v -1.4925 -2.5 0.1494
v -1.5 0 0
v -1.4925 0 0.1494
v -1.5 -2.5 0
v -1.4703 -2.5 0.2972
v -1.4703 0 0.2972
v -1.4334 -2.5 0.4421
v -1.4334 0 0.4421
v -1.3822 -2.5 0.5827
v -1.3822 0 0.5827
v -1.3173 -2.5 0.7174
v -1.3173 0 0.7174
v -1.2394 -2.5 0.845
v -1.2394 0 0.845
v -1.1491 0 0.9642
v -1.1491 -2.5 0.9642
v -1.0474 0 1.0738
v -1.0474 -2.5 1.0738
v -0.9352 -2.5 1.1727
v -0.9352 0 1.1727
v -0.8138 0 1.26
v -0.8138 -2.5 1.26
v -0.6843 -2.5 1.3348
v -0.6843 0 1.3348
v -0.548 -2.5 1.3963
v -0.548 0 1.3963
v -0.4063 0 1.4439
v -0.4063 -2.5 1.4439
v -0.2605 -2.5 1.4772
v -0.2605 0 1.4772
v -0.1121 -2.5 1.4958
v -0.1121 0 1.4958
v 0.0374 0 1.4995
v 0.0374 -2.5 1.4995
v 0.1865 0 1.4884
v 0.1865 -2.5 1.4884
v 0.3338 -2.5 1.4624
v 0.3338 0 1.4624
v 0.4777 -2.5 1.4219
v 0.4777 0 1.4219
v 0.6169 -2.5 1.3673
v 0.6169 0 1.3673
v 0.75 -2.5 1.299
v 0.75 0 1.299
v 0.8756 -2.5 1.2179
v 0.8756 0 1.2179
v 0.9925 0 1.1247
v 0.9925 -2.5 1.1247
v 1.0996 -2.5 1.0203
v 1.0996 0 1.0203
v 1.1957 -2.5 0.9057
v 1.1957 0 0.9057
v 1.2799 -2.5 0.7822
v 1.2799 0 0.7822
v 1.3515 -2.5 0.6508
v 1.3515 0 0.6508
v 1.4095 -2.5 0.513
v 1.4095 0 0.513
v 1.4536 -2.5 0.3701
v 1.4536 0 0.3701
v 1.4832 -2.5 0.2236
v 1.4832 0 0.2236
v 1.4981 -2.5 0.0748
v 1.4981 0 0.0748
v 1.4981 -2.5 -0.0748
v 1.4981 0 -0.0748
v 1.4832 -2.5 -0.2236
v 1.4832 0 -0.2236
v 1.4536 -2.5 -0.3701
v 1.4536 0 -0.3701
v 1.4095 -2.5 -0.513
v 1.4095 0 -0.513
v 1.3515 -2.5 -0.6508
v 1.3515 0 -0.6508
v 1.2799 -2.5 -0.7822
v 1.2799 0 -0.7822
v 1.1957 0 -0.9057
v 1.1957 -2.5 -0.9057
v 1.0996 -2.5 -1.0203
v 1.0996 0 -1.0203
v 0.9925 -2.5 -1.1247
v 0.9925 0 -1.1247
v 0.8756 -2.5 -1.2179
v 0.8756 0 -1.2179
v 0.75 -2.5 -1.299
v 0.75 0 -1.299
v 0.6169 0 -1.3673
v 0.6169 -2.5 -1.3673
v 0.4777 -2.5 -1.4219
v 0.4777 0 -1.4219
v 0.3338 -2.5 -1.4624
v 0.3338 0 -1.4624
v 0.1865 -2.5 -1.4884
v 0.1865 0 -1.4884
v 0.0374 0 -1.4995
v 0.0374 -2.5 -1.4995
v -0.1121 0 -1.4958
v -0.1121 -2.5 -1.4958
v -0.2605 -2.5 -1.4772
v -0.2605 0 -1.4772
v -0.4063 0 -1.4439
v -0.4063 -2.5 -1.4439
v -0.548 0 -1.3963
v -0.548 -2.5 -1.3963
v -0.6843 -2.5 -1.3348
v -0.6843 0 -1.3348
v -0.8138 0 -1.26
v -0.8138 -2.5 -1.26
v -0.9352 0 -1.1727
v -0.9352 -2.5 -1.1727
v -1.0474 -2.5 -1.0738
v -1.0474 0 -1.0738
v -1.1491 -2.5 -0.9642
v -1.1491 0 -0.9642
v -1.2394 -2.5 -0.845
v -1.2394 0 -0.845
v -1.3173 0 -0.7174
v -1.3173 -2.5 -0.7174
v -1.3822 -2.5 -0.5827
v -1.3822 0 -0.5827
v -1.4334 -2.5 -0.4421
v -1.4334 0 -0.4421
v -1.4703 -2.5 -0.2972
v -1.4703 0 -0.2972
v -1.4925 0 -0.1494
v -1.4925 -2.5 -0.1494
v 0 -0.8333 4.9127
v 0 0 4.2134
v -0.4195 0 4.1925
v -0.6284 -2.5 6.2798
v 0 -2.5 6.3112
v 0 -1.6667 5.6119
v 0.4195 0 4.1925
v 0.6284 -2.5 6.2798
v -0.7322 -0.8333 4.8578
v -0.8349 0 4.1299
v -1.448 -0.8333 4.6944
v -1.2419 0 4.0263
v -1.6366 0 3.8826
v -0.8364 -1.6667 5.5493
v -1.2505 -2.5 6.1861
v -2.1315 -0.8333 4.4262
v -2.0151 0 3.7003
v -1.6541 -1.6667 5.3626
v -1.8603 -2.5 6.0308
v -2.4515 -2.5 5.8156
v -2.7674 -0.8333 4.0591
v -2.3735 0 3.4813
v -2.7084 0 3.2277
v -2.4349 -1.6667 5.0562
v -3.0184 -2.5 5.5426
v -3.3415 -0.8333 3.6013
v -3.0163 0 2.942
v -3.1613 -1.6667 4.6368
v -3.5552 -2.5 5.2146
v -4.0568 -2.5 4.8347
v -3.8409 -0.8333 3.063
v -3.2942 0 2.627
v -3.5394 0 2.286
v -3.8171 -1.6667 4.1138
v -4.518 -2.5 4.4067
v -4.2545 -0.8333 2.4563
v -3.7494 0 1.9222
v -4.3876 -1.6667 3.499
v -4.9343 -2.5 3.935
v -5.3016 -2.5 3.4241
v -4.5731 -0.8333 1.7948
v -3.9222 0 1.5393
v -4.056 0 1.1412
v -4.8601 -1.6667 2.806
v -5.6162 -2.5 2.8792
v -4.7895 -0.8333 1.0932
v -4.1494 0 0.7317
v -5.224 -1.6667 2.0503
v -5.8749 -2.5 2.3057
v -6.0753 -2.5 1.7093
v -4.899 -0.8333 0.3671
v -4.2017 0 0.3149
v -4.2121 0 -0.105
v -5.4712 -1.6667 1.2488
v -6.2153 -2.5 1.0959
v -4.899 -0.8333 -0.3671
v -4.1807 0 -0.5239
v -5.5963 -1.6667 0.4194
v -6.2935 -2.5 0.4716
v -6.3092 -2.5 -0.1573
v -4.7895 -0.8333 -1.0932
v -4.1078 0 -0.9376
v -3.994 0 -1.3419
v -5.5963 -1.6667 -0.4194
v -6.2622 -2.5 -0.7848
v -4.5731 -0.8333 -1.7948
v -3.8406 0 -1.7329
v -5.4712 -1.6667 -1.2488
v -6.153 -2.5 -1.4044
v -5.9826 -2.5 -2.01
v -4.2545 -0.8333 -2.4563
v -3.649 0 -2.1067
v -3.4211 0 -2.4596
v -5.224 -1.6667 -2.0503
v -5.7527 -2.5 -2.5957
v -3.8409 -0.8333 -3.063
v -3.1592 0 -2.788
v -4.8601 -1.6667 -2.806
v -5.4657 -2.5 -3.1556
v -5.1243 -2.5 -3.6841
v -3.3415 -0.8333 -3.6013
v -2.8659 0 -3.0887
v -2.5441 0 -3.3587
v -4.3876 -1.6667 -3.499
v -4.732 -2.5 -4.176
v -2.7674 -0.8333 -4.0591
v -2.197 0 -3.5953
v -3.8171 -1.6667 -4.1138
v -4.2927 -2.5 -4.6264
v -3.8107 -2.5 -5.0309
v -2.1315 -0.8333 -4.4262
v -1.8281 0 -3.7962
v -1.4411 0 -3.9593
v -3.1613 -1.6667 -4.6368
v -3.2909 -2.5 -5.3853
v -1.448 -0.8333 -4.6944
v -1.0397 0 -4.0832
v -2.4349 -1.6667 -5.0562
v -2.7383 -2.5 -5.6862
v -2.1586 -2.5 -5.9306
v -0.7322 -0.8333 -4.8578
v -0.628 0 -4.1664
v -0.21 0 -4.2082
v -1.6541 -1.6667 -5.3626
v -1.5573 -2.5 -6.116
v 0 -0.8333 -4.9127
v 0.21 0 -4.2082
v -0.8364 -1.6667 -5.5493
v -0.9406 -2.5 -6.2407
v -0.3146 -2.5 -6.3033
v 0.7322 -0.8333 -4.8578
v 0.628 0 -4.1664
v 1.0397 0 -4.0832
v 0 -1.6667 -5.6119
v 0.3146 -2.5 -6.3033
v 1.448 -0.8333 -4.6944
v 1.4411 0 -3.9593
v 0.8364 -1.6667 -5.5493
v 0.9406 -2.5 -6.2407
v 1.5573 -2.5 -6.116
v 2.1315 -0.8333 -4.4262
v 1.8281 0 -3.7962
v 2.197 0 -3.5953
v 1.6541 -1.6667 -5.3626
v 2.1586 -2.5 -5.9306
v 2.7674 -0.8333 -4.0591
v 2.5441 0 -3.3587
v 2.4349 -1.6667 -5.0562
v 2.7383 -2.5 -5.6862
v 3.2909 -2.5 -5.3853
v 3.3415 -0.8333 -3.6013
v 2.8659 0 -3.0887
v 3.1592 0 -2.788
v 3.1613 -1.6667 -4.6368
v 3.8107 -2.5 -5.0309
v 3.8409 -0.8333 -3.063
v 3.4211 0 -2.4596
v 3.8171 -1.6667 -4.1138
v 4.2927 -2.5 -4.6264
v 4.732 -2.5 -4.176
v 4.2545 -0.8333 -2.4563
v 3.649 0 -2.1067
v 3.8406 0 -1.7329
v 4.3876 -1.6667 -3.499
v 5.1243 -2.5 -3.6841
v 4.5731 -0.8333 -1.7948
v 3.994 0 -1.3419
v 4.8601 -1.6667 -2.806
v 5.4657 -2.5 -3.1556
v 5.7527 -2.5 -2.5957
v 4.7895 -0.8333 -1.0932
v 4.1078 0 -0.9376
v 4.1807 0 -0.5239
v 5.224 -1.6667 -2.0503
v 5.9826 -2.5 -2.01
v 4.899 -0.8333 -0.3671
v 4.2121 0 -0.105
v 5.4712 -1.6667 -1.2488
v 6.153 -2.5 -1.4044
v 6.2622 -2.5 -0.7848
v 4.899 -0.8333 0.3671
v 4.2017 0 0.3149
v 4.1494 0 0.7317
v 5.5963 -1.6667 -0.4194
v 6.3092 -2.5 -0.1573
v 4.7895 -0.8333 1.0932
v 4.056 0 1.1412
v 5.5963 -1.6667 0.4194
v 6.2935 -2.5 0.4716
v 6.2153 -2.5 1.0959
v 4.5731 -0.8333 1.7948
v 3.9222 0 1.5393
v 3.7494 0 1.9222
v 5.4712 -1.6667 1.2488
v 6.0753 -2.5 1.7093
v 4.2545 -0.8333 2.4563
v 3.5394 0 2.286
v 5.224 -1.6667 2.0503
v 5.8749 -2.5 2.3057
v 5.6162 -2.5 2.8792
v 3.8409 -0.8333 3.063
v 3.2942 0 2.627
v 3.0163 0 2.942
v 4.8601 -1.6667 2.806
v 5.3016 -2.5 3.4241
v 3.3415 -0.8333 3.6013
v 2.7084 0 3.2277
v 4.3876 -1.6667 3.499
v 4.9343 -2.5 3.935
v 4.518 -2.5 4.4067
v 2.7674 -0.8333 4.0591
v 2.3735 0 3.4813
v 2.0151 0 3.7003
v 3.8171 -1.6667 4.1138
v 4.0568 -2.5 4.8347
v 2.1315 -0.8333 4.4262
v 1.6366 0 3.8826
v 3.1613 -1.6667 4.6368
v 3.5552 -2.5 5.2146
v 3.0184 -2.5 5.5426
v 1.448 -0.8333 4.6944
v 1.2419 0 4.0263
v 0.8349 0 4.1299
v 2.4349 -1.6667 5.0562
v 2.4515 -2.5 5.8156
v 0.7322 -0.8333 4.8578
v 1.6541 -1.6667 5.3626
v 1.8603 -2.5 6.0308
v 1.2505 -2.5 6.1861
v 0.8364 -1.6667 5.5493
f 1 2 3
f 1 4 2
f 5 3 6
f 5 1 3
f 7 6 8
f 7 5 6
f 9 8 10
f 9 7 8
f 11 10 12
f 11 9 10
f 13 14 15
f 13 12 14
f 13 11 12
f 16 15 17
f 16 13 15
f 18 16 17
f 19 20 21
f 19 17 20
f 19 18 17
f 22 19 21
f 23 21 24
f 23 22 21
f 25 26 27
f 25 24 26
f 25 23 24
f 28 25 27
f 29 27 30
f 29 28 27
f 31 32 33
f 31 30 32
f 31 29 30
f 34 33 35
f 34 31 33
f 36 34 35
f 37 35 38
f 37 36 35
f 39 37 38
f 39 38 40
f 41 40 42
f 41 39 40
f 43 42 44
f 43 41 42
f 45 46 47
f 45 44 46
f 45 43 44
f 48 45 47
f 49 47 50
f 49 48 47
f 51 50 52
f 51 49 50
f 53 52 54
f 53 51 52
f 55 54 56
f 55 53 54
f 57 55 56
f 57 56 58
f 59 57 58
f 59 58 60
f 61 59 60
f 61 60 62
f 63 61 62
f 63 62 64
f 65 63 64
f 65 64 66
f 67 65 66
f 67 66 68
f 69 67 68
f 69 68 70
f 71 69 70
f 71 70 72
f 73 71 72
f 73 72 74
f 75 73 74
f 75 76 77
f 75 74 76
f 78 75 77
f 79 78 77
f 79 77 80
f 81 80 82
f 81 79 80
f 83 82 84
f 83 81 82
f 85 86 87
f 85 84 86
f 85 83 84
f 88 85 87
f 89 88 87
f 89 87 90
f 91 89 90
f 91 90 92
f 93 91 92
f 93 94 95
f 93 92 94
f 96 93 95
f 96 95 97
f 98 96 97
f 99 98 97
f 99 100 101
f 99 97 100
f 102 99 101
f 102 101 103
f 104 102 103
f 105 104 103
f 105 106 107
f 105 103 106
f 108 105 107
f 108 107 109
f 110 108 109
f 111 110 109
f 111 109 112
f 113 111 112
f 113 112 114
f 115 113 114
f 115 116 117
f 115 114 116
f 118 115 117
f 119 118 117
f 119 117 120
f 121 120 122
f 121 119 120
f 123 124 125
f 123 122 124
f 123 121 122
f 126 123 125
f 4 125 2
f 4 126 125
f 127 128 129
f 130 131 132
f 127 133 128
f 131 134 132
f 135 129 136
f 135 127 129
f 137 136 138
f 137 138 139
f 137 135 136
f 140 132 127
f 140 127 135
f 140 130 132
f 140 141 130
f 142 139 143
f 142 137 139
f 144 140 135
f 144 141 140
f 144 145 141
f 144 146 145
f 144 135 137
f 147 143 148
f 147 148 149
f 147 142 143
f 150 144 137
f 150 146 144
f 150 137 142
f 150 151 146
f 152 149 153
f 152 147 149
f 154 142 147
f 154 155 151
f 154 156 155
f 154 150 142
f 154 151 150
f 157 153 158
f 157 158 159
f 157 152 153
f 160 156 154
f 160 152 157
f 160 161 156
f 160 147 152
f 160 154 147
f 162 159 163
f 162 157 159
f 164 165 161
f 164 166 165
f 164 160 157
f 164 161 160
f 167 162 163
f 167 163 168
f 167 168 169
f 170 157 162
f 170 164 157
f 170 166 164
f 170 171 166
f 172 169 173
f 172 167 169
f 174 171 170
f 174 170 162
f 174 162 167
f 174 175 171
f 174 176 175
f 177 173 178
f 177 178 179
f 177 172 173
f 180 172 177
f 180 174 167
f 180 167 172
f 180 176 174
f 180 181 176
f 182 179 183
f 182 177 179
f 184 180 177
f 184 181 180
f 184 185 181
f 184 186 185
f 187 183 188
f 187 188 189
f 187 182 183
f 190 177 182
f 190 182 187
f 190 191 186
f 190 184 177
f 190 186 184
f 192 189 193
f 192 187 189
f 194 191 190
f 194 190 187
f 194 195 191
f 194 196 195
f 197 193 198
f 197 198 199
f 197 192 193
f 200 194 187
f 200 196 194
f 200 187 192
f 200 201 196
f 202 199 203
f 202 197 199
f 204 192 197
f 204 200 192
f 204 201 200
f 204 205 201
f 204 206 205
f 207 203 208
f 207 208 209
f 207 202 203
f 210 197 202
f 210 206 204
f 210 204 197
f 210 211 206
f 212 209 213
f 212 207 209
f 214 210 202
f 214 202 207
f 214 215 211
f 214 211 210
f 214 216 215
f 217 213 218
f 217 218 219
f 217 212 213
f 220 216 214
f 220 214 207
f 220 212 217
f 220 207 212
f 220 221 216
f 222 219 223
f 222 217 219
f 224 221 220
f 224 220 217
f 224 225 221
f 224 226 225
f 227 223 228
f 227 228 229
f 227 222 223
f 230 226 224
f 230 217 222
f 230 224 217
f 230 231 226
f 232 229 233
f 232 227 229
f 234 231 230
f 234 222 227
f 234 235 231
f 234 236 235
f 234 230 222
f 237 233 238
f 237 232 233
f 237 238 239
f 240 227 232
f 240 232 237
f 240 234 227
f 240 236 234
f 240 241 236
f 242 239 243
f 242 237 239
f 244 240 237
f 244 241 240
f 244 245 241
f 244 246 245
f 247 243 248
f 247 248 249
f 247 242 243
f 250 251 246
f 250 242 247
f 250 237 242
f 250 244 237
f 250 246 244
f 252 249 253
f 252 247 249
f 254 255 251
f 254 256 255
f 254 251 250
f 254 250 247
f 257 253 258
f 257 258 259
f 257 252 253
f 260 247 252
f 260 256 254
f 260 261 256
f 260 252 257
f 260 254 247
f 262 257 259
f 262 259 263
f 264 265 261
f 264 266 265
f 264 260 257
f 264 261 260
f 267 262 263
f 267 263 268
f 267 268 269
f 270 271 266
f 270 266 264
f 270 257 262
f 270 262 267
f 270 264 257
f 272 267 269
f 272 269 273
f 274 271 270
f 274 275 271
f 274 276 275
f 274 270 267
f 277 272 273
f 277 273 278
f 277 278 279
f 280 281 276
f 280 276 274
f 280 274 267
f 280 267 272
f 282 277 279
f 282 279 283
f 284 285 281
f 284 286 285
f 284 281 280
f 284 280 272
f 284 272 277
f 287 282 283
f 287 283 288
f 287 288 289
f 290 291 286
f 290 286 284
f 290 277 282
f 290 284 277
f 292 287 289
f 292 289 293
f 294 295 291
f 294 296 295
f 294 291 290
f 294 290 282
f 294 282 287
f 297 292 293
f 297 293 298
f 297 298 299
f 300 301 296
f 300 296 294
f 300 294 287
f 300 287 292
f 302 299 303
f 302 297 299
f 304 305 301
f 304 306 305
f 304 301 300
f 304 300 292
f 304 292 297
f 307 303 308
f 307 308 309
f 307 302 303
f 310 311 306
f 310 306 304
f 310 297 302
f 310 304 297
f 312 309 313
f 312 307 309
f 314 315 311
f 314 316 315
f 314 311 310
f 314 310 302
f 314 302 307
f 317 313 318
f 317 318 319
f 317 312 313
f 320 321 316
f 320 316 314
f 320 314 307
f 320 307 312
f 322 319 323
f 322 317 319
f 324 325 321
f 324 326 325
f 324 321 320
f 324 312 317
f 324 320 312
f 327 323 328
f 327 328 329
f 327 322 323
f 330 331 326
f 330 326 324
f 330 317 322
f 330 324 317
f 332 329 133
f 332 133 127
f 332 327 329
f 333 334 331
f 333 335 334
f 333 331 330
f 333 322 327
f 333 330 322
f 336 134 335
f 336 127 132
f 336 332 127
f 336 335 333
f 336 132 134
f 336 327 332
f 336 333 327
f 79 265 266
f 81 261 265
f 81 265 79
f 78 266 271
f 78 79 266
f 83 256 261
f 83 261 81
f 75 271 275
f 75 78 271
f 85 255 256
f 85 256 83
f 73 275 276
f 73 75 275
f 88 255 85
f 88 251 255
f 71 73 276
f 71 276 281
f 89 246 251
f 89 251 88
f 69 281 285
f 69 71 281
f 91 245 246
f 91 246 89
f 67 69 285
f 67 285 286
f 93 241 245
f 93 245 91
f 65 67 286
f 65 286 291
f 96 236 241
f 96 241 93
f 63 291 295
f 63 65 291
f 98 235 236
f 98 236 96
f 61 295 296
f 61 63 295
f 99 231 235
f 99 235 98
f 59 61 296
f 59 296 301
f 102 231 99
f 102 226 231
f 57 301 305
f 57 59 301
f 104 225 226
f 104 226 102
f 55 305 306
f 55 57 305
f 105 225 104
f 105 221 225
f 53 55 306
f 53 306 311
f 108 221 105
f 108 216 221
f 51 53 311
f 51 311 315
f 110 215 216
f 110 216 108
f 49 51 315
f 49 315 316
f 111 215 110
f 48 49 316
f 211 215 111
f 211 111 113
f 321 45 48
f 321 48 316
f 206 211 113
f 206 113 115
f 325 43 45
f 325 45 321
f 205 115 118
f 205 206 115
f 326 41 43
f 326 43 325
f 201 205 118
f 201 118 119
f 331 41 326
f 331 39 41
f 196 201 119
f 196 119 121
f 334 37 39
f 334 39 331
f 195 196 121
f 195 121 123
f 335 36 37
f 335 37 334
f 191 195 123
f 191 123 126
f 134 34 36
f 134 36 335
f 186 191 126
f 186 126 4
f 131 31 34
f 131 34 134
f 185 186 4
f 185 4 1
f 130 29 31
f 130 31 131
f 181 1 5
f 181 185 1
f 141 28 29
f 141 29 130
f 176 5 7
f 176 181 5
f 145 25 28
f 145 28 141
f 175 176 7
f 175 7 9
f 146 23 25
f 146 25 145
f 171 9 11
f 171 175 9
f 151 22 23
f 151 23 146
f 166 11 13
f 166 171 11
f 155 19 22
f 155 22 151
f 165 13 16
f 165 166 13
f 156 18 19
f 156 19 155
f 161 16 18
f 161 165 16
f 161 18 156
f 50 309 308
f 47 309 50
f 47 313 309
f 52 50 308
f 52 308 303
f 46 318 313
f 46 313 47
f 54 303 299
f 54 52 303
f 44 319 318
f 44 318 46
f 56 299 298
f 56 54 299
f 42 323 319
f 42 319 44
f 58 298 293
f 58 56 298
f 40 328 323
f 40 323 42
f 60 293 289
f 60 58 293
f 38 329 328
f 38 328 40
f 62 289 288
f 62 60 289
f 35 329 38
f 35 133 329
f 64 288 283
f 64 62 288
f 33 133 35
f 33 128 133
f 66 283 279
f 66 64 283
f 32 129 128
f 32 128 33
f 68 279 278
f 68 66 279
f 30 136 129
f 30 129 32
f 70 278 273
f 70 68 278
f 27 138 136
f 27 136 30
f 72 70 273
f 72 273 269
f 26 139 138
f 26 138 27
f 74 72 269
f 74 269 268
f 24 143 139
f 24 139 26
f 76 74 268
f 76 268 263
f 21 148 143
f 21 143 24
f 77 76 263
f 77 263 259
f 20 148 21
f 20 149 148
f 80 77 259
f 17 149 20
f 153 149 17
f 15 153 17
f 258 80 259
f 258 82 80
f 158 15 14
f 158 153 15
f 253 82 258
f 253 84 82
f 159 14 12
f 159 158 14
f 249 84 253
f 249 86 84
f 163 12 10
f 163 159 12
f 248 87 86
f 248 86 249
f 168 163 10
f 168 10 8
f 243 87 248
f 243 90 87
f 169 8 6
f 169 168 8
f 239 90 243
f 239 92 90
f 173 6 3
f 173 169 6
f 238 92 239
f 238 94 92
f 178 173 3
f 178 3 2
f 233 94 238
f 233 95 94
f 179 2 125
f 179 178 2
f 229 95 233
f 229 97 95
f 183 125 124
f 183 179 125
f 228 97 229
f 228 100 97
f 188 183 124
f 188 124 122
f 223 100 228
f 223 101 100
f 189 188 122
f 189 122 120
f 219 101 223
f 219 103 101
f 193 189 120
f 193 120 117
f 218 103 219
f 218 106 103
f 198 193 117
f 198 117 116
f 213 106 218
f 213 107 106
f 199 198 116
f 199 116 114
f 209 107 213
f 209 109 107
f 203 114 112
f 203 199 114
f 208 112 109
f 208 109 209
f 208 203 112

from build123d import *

# Parameters (mm, degrees)
CYLINDER_R          = 1.5
CYLINDER_DEPTH      = 10
CYLINDER_ROLL_ANGLE = 90
CUT_PLACEMENT_ANGLE = 180


with BuildPart() as cylinder:
    # Cylinder → Cylinder (new body)
    with BuildSketch(Plane.XY):
        Circle(CYLINDER_R)
    extrude(amount=CYLINDER_DEPTH)


with BuildPart() as cylinder_1:
    # Cylinder roll: moved
    add(cylinder.part.rotate(Axis((0, 0, 0), (1, 0, 0)), CYLINDER_ROLL_ANGLE))


with BuildPart() as cylinder_2:
    # Cylinder placement: moved
    add(cylinder_1.part.moved(Location((0, 5, 0))))


with BuildPart() as innerbearing:
    # Sketch004 → Revolution (revolve)
    with BuildSketch(Plane.YZ):
        Polygon((0, 4.213446), (2.5, 6.311195), (2.5, 0), (0, 0), align=None)
    revolve(axis=Axis((0, 0, 0), (0, 1, 0)))

    # Cut: cut Cylinder
    add(cylinder_2.part, mode=Mode.SUBTRACT)


with BuildPart() as innerbearing_1:
    # Cut placement: moved
    add(innerbearing.part.rotate(Axis((0, 0, 0), (0, 0, 1)), CUT_PLACEMENT_ANGLE))


solid = innerbearing_1.part
